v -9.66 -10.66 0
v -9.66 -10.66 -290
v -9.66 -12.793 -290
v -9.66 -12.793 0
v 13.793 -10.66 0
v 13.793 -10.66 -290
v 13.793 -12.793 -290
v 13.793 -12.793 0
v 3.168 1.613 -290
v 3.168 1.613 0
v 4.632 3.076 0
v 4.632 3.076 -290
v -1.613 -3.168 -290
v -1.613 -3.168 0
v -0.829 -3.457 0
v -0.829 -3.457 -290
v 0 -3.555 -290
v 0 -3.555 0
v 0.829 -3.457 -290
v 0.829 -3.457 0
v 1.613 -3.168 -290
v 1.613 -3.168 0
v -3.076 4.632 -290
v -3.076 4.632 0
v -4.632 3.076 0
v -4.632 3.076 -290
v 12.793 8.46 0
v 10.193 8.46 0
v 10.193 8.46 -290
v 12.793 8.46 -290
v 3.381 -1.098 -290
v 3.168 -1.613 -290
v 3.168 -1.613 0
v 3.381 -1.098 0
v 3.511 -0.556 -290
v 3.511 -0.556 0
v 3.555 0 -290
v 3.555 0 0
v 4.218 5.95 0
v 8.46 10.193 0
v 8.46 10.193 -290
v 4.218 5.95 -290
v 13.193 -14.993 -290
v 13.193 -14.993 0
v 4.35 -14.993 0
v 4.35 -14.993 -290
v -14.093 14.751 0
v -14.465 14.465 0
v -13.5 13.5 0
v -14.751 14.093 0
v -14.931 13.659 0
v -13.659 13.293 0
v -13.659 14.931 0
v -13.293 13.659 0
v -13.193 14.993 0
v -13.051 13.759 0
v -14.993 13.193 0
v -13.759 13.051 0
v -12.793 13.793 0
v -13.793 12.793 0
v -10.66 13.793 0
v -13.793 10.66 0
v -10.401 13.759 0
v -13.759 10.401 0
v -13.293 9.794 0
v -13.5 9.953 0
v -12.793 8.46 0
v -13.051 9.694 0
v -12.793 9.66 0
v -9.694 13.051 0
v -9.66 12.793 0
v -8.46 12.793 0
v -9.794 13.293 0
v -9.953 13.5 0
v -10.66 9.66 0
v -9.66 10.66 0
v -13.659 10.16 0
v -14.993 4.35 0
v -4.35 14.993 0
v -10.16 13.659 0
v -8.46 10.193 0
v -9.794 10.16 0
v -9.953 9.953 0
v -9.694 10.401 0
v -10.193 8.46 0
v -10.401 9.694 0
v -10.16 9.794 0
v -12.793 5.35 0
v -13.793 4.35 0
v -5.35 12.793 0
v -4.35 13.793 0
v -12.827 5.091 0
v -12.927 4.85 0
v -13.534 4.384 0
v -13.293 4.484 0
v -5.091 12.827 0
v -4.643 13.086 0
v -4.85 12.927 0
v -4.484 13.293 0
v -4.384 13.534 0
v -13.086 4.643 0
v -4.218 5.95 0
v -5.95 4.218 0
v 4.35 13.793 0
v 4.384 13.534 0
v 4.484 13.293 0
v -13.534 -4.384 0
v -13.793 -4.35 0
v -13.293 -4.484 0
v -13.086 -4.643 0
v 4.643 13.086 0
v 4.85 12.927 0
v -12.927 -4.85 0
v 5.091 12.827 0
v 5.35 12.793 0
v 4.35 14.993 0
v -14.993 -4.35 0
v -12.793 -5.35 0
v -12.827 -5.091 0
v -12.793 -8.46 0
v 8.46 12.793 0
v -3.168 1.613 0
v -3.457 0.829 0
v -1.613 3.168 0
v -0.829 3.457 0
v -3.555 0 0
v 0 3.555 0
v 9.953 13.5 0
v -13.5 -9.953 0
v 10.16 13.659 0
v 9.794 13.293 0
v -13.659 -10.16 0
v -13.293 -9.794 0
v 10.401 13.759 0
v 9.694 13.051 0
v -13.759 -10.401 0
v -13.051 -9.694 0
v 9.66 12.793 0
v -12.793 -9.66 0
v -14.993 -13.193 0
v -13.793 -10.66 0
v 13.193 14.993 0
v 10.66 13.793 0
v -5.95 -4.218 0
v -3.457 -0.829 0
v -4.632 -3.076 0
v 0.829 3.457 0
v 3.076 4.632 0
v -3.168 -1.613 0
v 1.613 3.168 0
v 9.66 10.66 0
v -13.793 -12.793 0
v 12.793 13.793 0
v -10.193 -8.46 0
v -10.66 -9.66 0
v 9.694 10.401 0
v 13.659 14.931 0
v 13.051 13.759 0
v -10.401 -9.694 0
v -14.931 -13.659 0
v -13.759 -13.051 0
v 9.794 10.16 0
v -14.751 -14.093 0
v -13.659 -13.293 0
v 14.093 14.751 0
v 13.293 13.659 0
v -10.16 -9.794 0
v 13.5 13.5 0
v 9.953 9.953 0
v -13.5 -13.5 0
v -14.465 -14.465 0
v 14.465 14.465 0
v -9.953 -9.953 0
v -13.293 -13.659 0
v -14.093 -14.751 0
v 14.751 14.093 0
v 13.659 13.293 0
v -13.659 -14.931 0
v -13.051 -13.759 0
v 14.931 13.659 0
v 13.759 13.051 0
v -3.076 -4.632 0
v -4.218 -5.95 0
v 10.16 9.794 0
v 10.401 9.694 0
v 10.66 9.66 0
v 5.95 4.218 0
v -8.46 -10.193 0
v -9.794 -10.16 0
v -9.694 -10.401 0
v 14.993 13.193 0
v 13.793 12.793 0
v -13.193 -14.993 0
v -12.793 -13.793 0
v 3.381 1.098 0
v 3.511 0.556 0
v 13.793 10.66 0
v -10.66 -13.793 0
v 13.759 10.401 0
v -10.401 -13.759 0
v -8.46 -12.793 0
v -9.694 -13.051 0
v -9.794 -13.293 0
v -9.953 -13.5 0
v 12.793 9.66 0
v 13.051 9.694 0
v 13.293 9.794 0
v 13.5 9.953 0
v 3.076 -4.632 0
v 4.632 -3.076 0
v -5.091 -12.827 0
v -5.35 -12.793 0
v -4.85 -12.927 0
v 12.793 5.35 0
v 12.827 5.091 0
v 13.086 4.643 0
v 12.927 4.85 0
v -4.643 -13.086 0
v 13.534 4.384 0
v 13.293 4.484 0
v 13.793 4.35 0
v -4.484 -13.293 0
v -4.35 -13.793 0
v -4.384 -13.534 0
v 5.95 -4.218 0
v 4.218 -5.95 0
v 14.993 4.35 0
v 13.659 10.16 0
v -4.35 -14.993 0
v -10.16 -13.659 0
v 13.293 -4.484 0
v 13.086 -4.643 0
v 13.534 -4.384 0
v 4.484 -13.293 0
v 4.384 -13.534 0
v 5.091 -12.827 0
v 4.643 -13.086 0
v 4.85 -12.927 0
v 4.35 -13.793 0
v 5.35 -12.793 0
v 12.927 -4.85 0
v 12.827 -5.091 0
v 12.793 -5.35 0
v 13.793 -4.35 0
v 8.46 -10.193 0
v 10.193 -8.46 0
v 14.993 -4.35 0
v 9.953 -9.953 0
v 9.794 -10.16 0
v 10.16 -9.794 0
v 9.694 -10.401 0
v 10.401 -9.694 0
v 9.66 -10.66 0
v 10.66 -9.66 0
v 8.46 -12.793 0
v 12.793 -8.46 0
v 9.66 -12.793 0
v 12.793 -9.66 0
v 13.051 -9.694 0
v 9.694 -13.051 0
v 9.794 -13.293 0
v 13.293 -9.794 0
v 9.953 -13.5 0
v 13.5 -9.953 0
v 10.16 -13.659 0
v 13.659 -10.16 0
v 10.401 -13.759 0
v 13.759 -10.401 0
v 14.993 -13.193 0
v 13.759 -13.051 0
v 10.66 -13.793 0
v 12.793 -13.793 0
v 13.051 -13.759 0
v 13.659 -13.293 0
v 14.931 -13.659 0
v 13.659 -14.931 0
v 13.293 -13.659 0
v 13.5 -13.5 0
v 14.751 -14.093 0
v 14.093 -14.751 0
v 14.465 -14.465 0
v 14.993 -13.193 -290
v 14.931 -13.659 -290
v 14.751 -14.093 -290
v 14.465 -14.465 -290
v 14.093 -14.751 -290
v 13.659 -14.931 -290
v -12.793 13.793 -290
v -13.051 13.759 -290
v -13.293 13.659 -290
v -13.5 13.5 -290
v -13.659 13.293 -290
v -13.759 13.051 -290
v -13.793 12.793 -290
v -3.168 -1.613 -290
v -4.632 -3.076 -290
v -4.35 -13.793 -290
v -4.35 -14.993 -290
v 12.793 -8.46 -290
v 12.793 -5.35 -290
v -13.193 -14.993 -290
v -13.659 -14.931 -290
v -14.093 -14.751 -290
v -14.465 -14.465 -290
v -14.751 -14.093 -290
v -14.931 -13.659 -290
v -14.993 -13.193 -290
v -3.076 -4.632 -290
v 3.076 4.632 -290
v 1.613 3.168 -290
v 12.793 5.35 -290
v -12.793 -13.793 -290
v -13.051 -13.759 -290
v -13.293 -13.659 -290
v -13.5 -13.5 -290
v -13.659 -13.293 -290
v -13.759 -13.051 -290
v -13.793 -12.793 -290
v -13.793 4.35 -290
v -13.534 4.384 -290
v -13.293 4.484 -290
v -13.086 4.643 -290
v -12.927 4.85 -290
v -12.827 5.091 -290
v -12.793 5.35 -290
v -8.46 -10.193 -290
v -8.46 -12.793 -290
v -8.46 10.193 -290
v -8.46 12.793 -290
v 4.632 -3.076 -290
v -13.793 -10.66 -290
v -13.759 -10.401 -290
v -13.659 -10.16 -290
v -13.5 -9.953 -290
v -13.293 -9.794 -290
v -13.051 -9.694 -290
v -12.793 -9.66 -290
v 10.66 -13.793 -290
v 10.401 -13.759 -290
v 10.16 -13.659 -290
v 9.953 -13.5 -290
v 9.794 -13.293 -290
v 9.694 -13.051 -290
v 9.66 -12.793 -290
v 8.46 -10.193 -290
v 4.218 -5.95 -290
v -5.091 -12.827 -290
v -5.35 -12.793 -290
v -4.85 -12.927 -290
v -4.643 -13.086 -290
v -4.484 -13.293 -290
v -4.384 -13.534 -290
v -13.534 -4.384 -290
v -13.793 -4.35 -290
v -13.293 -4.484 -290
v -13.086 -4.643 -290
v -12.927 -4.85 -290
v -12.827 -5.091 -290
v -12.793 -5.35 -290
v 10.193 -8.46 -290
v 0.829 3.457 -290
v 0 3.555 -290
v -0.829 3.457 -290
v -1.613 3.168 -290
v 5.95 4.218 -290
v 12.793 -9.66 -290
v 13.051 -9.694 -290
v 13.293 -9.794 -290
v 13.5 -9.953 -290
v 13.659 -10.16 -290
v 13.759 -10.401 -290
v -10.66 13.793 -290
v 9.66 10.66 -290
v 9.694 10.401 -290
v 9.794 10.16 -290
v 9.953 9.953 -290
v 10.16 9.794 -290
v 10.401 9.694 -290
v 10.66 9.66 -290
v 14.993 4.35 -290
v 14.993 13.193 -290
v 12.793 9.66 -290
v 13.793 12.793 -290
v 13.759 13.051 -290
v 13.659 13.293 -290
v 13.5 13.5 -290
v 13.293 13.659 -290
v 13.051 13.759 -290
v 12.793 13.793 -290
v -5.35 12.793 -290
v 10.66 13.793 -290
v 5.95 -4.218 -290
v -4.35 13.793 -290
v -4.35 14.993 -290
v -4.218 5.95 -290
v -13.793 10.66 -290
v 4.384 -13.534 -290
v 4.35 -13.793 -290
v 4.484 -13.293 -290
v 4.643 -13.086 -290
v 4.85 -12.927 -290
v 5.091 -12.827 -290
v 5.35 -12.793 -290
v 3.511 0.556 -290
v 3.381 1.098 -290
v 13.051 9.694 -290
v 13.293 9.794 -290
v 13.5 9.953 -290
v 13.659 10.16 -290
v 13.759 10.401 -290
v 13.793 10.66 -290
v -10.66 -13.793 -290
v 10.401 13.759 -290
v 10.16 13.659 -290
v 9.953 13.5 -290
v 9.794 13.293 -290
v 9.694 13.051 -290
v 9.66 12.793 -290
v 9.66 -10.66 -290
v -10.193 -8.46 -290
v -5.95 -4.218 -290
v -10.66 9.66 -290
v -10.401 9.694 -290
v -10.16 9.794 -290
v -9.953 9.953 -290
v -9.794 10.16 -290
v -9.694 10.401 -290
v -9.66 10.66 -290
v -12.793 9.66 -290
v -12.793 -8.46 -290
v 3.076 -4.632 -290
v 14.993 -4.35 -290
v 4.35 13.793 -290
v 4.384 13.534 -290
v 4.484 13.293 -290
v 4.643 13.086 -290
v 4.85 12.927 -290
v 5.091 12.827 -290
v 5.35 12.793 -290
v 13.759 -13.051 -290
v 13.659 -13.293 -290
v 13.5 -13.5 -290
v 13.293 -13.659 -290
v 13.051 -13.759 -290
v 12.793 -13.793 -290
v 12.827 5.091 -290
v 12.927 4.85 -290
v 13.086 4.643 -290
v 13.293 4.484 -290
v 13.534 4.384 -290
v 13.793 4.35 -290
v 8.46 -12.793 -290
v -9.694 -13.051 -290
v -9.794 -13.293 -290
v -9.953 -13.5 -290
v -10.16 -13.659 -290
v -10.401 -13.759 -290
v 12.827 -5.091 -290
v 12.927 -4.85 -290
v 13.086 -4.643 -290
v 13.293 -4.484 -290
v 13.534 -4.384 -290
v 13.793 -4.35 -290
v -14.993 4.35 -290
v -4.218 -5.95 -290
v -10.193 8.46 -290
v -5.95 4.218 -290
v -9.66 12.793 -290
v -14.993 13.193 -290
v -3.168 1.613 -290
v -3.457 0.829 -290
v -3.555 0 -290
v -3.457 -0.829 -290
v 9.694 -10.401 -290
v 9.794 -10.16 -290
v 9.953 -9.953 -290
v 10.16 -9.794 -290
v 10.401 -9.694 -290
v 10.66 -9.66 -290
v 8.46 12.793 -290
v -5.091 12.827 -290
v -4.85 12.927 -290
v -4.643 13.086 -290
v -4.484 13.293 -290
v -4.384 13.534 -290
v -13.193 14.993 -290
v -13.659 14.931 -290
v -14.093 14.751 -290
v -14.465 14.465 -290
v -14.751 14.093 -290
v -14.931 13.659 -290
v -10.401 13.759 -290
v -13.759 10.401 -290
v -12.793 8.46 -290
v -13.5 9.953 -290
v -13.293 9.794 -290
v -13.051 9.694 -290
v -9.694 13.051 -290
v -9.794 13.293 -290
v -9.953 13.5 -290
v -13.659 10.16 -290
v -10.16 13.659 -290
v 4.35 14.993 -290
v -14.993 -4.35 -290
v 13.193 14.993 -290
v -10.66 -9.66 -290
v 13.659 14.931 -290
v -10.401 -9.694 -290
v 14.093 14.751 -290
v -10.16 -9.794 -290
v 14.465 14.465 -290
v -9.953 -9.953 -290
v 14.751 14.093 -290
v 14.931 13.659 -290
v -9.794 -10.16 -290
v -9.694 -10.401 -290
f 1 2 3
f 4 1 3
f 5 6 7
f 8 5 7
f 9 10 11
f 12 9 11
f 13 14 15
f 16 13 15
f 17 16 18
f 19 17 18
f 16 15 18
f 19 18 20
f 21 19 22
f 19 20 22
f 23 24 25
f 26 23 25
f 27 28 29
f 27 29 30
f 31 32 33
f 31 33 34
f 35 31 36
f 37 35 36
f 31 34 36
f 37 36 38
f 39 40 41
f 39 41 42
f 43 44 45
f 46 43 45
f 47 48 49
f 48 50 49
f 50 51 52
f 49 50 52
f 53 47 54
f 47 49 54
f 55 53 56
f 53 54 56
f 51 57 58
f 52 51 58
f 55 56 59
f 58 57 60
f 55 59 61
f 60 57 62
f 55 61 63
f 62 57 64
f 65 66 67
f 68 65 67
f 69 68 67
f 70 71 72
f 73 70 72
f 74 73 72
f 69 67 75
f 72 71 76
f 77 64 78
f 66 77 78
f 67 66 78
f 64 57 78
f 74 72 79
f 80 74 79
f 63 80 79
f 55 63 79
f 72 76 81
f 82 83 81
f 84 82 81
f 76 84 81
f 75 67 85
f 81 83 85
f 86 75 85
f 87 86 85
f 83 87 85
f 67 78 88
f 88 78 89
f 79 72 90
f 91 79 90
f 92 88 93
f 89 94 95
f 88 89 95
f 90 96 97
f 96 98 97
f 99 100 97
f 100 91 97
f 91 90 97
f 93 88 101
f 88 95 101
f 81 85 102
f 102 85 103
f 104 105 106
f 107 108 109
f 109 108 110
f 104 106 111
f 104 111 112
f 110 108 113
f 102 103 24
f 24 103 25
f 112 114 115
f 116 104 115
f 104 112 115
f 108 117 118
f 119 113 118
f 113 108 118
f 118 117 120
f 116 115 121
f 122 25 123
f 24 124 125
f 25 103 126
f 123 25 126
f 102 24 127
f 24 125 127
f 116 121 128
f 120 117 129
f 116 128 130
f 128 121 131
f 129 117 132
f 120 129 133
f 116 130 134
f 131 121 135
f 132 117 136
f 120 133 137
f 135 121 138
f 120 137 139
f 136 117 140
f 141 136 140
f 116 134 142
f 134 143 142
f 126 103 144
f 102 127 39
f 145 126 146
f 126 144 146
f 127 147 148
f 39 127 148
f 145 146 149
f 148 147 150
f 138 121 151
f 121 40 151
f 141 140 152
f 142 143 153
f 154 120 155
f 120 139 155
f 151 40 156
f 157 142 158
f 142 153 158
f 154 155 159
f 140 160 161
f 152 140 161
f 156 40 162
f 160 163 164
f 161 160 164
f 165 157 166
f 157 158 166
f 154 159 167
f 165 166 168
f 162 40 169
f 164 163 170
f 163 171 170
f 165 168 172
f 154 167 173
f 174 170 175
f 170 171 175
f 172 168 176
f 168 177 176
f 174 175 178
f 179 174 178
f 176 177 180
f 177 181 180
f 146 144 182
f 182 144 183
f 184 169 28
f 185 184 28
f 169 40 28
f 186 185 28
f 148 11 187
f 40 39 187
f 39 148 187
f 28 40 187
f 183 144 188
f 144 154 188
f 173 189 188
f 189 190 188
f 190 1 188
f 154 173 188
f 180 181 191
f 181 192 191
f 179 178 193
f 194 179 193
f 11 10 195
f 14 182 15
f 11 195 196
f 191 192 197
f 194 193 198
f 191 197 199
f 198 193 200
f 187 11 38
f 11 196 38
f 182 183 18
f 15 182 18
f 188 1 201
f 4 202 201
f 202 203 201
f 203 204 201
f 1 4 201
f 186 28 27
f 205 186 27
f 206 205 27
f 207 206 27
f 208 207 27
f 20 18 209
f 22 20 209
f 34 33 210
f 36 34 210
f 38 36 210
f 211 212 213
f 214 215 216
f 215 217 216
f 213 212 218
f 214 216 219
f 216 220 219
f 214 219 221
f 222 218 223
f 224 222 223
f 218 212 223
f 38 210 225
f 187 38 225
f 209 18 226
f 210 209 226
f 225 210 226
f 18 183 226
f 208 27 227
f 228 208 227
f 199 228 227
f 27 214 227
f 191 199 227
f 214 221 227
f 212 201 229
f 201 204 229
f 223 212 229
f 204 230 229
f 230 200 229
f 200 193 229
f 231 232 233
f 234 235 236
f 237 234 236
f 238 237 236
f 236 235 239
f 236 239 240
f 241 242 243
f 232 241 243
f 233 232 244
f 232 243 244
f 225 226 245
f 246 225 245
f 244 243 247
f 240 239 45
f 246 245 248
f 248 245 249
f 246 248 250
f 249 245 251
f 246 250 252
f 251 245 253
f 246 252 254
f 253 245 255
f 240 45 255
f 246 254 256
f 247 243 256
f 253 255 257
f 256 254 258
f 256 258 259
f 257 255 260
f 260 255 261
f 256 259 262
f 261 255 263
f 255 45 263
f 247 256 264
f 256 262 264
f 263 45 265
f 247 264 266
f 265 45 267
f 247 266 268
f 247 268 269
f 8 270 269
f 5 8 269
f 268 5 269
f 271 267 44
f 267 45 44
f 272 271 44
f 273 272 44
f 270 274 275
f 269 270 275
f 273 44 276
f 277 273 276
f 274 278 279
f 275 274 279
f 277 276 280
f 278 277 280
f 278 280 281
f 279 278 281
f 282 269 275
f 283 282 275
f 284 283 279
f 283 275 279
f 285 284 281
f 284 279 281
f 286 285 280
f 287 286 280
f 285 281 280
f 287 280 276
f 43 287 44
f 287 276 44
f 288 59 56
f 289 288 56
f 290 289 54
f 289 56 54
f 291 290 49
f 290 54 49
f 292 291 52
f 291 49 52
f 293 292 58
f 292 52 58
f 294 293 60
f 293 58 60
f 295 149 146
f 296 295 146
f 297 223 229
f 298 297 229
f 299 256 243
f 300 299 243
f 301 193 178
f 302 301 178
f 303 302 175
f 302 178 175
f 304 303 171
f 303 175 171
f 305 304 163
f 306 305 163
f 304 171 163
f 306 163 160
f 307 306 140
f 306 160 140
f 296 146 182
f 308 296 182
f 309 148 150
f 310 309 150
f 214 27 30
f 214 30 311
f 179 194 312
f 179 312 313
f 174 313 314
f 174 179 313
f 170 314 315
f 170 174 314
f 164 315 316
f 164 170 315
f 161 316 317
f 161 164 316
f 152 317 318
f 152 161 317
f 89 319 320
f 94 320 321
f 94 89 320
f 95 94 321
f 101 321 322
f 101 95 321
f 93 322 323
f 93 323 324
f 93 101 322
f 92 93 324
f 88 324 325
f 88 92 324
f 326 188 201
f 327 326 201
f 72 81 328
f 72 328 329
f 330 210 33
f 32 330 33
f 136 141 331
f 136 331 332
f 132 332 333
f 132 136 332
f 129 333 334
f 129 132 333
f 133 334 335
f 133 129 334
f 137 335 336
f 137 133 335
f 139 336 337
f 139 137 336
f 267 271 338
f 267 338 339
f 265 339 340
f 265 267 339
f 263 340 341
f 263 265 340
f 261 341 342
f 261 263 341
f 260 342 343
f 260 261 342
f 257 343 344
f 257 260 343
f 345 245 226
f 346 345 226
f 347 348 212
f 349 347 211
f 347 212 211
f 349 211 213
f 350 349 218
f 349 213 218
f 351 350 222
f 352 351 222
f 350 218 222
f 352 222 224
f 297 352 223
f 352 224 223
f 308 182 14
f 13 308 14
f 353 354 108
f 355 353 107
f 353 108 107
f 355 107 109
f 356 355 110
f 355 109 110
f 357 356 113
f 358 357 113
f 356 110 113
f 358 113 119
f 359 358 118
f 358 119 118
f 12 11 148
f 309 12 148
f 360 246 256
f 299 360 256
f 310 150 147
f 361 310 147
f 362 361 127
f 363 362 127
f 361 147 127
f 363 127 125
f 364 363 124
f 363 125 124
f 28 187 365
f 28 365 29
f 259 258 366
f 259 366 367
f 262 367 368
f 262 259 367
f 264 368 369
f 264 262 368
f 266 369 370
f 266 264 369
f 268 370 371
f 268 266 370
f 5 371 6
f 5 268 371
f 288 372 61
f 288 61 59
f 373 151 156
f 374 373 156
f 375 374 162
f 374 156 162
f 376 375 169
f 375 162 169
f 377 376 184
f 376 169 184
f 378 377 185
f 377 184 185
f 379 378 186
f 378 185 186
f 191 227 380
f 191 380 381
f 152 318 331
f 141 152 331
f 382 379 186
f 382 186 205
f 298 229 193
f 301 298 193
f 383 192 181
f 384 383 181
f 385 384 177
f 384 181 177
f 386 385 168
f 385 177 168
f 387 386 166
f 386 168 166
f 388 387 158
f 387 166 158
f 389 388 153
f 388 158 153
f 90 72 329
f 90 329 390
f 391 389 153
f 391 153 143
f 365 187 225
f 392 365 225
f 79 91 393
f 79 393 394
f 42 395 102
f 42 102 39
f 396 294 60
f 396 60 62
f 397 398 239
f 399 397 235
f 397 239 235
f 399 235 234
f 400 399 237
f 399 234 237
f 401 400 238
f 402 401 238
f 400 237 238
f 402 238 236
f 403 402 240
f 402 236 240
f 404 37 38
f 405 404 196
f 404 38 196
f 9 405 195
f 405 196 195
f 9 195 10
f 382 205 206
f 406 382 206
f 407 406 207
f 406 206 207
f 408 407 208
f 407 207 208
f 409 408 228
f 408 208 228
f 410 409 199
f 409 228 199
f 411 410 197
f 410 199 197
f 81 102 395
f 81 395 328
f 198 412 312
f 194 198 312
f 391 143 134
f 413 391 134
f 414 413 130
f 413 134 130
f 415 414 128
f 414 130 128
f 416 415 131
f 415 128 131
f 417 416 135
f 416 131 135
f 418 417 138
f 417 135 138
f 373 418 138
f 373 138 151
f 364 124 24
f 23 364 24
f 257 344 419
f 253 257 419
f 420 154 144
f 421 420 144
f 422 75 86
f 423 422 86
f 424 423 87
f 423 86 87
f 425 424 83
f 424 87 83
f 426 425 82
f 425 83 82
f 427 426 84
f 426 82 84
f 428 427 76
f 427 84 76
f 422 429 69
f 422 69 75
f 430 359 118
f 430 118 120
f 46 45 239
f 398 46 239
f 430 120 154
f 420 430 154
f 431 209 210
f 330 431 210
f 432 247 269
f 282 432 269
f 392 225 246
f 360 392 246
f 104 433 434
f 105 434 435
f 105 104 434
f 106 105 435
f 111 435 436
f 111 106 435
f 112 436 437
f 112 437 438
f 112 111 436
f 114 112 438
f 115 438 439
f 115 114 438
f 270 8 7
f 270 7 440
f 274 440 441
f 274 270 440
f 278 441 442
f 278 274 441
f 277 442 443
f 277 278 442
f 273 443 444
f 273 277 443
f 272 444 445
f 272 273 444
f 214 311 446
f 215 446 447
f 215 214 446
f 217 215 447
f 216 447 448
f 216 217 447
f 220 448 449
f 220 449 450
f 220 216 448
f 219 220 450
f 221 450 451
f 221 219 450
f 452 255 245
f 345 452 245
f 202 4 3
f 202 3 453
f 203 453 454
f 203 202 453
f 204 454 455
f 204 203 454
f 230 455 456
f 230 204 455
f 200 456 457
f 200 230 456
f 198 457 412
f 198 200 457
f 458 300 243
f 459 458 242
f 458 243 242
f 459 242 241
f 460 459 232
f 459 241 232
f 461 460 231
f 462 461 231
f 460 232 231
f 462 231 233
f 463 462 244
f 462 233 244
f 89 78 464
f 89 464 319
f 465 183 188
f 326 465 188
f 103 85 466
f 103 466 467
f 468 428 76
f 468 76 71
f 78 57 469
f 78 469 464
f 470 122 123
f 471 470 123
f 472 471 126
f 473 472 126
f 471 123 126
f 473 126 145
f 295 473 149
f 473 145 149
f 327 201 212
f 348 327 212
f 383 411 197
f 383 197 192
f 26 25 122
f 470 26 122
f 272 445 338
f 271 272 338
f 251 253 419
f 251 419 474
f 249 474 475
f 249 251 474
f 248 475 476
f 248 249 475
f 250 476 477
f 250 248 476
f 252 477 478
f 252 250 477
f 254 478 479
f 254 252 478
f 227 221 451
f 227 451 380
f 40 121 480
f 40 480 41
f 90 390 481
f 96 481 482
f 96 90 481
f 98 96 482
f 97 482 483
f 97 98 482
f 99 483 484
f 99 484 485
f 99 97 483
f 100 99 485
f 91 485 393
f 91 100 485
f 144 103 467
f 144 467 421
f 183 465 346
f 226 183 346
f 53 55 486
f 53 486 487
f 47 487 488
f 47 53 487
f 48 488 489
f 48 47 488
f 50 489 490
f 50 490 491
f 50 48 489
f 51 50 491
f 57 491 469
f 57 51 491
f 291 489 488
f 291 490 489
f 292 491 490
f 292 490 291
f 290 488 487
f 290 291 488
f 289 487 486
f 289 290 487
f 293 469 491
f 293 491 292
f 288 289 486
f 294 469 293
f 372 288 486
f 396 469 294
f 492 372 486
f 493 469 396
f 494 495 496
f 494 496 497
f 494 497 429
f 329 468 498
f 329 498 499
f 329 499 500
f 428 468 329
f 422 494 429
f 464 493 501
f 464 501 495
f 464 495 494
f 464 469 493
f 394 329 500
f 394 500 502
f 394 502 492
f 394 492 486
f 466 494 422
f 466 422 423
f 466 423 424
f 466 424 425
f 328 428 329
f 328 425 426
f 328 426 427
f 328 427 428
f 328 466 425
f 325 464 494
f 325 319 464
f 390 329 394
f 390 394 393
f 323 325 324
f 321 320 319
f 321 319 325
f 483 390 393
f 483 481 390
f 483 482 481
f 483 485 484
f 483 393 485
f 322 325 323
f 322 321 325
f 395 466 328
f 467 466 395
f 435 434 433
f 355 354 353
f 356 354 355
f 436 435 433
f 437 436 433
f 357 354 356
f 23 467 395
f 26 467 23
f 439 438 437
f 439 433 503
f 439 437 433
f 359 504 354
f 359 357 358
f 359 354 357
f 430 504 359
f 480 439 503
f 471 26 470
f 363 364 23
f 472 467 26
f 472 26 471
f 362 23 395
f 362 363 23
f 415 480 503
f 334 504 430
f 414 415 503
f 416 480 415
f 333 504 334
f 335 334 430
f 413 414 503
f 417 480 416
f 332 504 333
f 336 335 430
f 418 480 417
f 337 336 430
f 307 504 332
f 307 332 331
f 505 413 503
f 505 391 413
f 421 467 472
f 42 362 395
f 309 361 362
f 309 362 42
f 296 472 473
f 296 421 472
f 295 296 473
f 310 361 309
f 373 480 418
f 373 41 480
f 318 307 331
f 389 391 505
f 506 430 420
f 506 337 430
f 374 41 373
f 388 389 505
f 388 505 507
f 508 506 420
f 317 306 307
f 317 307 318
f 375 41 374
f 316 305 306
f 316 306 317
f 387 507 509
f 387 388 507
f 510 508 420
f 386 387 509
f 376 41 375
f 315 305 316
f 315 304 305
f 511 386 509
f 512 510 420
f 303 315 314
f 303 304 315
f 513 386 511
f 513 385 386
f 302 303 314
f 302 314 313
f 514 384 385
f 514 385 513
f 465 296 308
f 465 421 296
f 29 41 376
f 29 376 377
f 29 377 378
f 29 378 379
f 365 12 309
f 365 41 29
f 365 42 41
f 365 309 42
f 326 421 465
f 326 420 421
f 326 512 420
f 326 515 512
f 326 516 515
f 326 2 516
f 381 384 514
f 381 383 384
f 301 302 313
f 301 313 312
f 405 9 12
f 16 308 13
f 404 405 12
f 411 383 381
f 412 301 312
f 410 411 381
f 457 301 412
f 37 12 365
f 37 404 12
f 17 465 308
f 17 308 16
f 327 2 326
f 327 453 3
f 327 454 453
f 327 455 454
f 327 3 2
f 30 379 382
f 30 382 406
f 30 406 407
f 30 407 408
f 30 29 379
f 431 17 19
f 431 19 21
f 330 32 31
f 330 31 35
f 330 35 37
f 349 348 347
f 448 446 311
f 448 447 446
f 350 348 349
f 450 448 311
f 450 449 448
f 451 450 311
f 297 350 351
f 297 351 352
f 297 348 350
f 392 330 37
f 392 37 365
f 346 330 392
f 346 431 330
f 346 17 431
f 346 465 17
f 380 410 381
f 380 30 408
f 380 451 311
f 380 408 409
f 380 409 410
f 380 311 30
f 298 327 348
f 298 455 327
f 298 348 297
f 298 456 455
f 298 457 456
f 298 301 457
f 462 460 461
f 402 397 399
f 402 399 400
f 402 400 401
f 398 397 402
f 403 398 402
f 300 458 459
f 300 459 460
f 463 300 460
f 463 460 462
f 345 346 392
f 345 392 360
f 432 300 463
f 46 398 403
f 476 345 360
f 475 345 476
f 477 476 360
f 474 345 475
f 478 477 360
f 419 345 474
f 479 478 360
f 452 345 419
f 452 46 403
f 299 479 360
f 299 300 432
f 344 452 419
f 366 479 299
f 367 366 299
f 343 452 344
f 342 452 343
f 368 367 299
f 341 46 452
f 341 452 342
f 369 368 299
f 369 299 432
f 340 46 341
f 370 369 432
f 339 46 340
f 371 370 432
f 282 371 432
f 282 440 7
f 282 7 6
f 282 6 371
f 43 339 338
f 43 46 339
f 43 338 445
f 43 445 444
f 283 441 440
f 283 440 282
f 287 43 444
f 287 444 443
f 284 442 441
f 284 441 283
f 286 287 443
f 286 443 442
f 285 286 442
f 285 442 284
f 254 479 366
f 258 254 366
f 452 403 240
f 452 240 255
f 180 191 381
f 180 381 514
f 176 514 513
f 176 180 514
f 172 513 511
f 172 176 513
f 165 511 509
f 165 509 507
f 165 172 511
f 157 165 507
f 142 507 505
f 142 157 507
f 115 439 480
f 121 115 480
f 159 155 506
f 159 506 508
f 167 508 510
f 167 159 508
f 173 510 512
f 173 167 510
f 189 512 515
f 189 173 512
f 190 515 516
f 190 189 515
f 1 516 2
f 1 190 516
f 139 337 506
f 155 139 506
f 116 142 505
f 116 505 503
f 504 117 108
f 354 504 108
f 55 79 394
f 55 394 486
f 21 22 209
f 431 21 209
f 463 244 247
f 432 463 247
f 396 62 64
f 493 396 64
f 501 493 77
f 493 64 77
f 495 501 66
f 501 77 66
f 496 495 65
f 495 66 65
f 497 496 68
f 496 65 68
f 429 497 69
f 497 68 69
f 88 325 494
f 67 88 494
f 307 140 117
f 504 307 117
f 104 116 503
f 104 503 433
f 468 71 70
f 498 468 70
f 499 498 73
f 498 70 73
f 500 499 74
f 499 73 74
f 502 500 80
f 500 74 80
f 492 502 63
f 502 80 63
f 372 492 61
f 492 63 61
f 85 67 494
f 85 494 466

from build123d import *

# Parameters (mm, degrees)
SKETCH1_W           = 11.9
SKETCH1_H           = 5.95
BOSS_EXTRUDE1_DEPTH = 290
CUT_EXTRUDE1_DEPTH  = 291


with BuildPart() as part:
    # Sketch1 → Boss-Extrude1 (new body)
    with BuildSketch(Plane.XY):
        with BuildLine():
            Line((-4.350229073, 14.992640687), (-13.192640687, 14.992640687))
            ThreePointArc((-13.192640687, 14.992640687), (-14.465432893, 14.465432893), (-14.992640687, 13.192640687))
            Line((-14.992640687, 13.192640687), (-14.992640687, 4.350229073))
            Line((-14.992640687, 4.350229073), (-13.792640687, 4.350229073))
            ThreePointArc((-13.792640687, 4.350229073), (-13.085533906, 4.643122292), (-12.792640687, 5.350229073))
            Line((-12.792640687, 5.350229073), (-12.792640687, 8.460229073))
            Line((-12.792640687, 8.460229073), (-8.460229073, 8.460229073))
            Line((-8.460229073, 8.460229073), (-8.460229073, 12.792640687))
            Line((-8.460229073, 12.792640687), (-5.350229073, 12.792640687))
            ThreePointArc((-5.350229073, 12.792640687), (-4.643122292, 13.085533906), (-4.350229073, 13.792640687))
            Line((-4.350229073, 13.792640687), (-4.350229073, 14.992640687))
        make_face()
        with BuildLine():
            Line((-10.660229073, 13.792640687), (-12.792640687, 13.792640687))
            ThreePointArc((-12.792640687, 13.792640687), (-13.499747468, 13.499747468), (-13.792640687, 12.792640687))
            Line((-13.792640687, 12.792640687), (-13.792640687, 10.660229073))
            ThreePointArc((-13.792640687, 10.660229073), (-13.499747468, 9.953122292), (-12.792640687, 9.660229073))
            Line((-12.792640687, 9.660229073), (-10.660229073, 9.660229073))
            ThreePointArc((-10.660229073, 9.660229073), (-9.953122292, 9.953122292), (-9.660229073, 10.660229073))
            Line((-9.660229073, 10.660229073), (-9.660229073, 12.792640687))
            ThreePointArc((-9.660229073, 12.792640687), (-9.953122292, 13.499747468), (-10.660229073, 13.792640687))
        make_face(mode=Mode.SUBTRACT)
        Polygon((-5.95, 4.217588386), (-5.95, 5.95), (-4.217588386, 5.95), (-8.460229073, 10.192640687), (-8.460229073, 8.460229073), (-10.192640687, 8.460229073), align=None)
        with Locations((0, 2.975)):
            Rectangle(SKETCH1_W, SKETCH1_H)
        Polygon((8.460229073, 10.192640687), (4.217588386, 5.95), (5.95, 5.95), (5.95, 4.217588386), (10.192640687, 8.460229073), (8.460229073, 8.460229073), align=None)
        with BuildLine():
            Line((12.792640687, 8.460229073), (12.792640687, 5.350229073))
            ThreePointArc((12.792640687, 5.350229073), (13.085533906, 4.643122292), (13.792640687, 4.350229073))
            Line((13.792640687, 4.350229073), (14.992640687, 4.350229073))
            Line((14.992640687, 4.350229073), (14.992640687, 13.192640687))
            ThreePointArc((14.992640687, 13.192640687), (14.465432893, 14.465432893), (13.192640687, 14.992640687))
            Line((13.192640687, 14.992640687), (4.350229073, 14.992640687))
            Line((4.350229073, 14.992640687), (4.350229073, 13.792640687))
            ThreePointArc((4.350229073, 13.792640687), (4.643122292, 13.085533906), (5.350229073, 12.792640687))
            Line((5.350229073, 12.792640687), (8.460229073, 12.792640687))
            Line((8.460229073, 12.792640687), (8.460229073, 8.460229073))
            Line((8.460229073, 8.460229073), (12.792640687, 8.460229073))
        make_face()
        with BuildLine():
            ThreePointArc((9.660229073, 10.660229073), (9.953122292, 9.953122292), (10.660229073, 9.660229073))
            Line((10.660229073, 9.660229073), (12.792640687, 9.660229073))
            ThreePointArc((12.792640687, 9.660229073), (13.499747468, 9.953122292), (13.792640687, 10.660229073))
            Line((13.792640687, 10.660229073), (13.792640687, 12.792640687))
            ThreePointArc((13.792640687, 12.792640687), (13.499747468, 13.499747468), (12.792640687, 13.792640687))
            Line((12.792640687, 13.792640687), (10.660229073, 13.792640687))
            ThreePointArc((10.660229073, 13.792640687), (9.953122292, 13.499747468), (9.660229073, 12.792640687))
            Line((9.660229073, 12.792640687), (9.660229073, 10.660229073))
        make_face(mode=Mode.SUBTRACT)
    extrude(amount=-BOSS_EXTRUDE1_DEPTH)

    # Mirror1: part across plane


with BuildPart() as part_1:
    add(part.part)
    add(part.part.mirror(Plane(origin=(0, 0, -290), x_dir=(0, 0, 1), z_dir=(0, -1, 0))))

    # Sketch2 → Cut-Extrude1 (cut, through all)
    with BuildSketch(Plane.XY):
        with BuildLine():
            Line((-4.631549417, 3.075914498), (-3.16821753, 1.612582612))
            ThreePointArc((-3.16821753, 1.612582612), (-2.513764607, 2.513764607), (-1.612582612, 3.16821753))
            Line((-1.612582612, 3.16821753), (-3.075914498, 4.631549417))
            Line((-3.075914498, 4.631549417), (-4.631549417, 3.075914498))
        make_face()
        with BuildLine():
            Line((-3.16821753, 1.612582612), (-1.555634919, 0))
            Line((-1.555634919, 0), (0, 1.555634919))
            Line((0, 1.555634919), (-1.612582612, 3.16821753))
            ThreePointArc((-1.612582612, 3.16821753), (-2.513764607, 2.513764607), (-3.16821753, 1.612582612))
        make_face()
        with BuildLine():
            ThreePointArc((-3.16821753, 1.612582612), (-3.555, 0), (-3.16821753, -1.612582612))
            Line((-3.16821753, -1.612582612), (-1.555634919, 0))
            Line((-1.555634919, 0), (-3.16821753, 1.612582612))
        make_face()
        with BuildLine():
            Line((-4.631549417, -3.075914498), (-3.075914498, -4.631549417))
            Line((-3.075914498, -4.631549417), (-1.612582612, -3.16821753))
            ThreePointArc((-1.612582612, -3.16821753), (-2.513764607, -2.513764607), (-3.16821753, -1.612582612))
            Line((-3.16821753, -1.612582612), (-4.631549417, -3.075914498))
        make_face()
        with BuildLine():
            ThreePointArc((-3.16821753, -1.612582612), (-2.513764607, -2.513764607), (-1.612582612, -3.16821753))
            Line((-1.612582612, -3.16821753), (0, -1.555634919))
            Line((0, -1.555634919), (-1.555634919, 0))
            Line((-1.555634919, 0), (-3.16821753, -1.612582612))
        make_face()
        with BuildLine():
            Line((0, -1.555634919), (-1.612582612, -3.16821753))
            ThreePointArc((-1.612582612, -3.16821753), (0, -3.555), (1.612582612, -3.16821753))
            Line((1.612582612, -3.16821753), (0, -1.555634919))
        make_face()
        with BuildLine():
            Line((1.555634919, 0), (0, -1.555634919))
            Line((0, -1.555634919), (1.612582612, -3.16821753))
            ThreePointArc((1.612582612, -3.16821753), (2.513764607, -2.513764607), (3.16821753, -1.612582612))
            Line((3.16821753, -1.612582612), (1.555634919, 0))
        make_face()
        with BuildLine():
            Line((3.16821753, 1.612582612), (1.555634919, 0))
            Line((1.555634919, 0), (3.16821753, -1.612582612))
            ThreePointArc((3.16821753, -1.612582612), (3.456952294, -0.829159719), (3.555, 0))
            ThreePointArc((3.555, 0), (3.456952294, 0.829159719), (3.16821753, 1.612582612))
        make_face()
        Polygon((-1.555634919, 0), (0, -1.555634919), (1.555634919, 0), (0, 1.555634919), align=None)
        with BuildLine():
            Line((0, 1.555634919), (1.555634919, 0))
            Line((1.555634919, 0), (3.16821753, 1.612582612))
            ThreePointArc((3.16821753, 1.612582612), (2.513764607, 2.513764607), (1.612582612, 3.16821753))
            Line((1.612582612, 3.16821753), (0, 1.555634919))
        make_face()
        with BuildLine():
            Line((-1.612582612, 3.16821753), (0, 1.555634919))
            Line((0, 1.555634919), (1.612582612, 3.16821753))
            ThreePointArc((1.612582612, 3.16821753), (0, 3.555), (-1.612582612, 3.16821753))
        make_face()
        with BuildLine():
            ThreePointArc((1.612582612, 3.16821753), (2.513764607, 2.513764607), (3.16821753, 1.612582612))
            Line((3.16821753, 1.612582612), (4.631549417, 3.075914498))
            Line((4.631549417, 3.075914498), (3.075914498, 4.631549417))
            Line((3.075914498, 4.631549417), (1.612582612, 3.16821753))
        make_face()
        with BuildLine():
            ThreePointArc((3.16821753, -1.612582612), (2.513764607, -2.513764607), (1.612582612, -3.16821753))
            Line((1.612582612, -3.16821753), (3.075914498, -4.631549417))
            Line((3.075914498, -4.631549417), (4.631549417, -3.075914498))
            Line((4.631549417, -3.075914498), (3.16821753, -1.612582612))
        make_face()
    extrude(amount=-CUT_EXTRUDE1_DEPTH, mode=Mode.SUBTRACT)


solid = part_1.part
